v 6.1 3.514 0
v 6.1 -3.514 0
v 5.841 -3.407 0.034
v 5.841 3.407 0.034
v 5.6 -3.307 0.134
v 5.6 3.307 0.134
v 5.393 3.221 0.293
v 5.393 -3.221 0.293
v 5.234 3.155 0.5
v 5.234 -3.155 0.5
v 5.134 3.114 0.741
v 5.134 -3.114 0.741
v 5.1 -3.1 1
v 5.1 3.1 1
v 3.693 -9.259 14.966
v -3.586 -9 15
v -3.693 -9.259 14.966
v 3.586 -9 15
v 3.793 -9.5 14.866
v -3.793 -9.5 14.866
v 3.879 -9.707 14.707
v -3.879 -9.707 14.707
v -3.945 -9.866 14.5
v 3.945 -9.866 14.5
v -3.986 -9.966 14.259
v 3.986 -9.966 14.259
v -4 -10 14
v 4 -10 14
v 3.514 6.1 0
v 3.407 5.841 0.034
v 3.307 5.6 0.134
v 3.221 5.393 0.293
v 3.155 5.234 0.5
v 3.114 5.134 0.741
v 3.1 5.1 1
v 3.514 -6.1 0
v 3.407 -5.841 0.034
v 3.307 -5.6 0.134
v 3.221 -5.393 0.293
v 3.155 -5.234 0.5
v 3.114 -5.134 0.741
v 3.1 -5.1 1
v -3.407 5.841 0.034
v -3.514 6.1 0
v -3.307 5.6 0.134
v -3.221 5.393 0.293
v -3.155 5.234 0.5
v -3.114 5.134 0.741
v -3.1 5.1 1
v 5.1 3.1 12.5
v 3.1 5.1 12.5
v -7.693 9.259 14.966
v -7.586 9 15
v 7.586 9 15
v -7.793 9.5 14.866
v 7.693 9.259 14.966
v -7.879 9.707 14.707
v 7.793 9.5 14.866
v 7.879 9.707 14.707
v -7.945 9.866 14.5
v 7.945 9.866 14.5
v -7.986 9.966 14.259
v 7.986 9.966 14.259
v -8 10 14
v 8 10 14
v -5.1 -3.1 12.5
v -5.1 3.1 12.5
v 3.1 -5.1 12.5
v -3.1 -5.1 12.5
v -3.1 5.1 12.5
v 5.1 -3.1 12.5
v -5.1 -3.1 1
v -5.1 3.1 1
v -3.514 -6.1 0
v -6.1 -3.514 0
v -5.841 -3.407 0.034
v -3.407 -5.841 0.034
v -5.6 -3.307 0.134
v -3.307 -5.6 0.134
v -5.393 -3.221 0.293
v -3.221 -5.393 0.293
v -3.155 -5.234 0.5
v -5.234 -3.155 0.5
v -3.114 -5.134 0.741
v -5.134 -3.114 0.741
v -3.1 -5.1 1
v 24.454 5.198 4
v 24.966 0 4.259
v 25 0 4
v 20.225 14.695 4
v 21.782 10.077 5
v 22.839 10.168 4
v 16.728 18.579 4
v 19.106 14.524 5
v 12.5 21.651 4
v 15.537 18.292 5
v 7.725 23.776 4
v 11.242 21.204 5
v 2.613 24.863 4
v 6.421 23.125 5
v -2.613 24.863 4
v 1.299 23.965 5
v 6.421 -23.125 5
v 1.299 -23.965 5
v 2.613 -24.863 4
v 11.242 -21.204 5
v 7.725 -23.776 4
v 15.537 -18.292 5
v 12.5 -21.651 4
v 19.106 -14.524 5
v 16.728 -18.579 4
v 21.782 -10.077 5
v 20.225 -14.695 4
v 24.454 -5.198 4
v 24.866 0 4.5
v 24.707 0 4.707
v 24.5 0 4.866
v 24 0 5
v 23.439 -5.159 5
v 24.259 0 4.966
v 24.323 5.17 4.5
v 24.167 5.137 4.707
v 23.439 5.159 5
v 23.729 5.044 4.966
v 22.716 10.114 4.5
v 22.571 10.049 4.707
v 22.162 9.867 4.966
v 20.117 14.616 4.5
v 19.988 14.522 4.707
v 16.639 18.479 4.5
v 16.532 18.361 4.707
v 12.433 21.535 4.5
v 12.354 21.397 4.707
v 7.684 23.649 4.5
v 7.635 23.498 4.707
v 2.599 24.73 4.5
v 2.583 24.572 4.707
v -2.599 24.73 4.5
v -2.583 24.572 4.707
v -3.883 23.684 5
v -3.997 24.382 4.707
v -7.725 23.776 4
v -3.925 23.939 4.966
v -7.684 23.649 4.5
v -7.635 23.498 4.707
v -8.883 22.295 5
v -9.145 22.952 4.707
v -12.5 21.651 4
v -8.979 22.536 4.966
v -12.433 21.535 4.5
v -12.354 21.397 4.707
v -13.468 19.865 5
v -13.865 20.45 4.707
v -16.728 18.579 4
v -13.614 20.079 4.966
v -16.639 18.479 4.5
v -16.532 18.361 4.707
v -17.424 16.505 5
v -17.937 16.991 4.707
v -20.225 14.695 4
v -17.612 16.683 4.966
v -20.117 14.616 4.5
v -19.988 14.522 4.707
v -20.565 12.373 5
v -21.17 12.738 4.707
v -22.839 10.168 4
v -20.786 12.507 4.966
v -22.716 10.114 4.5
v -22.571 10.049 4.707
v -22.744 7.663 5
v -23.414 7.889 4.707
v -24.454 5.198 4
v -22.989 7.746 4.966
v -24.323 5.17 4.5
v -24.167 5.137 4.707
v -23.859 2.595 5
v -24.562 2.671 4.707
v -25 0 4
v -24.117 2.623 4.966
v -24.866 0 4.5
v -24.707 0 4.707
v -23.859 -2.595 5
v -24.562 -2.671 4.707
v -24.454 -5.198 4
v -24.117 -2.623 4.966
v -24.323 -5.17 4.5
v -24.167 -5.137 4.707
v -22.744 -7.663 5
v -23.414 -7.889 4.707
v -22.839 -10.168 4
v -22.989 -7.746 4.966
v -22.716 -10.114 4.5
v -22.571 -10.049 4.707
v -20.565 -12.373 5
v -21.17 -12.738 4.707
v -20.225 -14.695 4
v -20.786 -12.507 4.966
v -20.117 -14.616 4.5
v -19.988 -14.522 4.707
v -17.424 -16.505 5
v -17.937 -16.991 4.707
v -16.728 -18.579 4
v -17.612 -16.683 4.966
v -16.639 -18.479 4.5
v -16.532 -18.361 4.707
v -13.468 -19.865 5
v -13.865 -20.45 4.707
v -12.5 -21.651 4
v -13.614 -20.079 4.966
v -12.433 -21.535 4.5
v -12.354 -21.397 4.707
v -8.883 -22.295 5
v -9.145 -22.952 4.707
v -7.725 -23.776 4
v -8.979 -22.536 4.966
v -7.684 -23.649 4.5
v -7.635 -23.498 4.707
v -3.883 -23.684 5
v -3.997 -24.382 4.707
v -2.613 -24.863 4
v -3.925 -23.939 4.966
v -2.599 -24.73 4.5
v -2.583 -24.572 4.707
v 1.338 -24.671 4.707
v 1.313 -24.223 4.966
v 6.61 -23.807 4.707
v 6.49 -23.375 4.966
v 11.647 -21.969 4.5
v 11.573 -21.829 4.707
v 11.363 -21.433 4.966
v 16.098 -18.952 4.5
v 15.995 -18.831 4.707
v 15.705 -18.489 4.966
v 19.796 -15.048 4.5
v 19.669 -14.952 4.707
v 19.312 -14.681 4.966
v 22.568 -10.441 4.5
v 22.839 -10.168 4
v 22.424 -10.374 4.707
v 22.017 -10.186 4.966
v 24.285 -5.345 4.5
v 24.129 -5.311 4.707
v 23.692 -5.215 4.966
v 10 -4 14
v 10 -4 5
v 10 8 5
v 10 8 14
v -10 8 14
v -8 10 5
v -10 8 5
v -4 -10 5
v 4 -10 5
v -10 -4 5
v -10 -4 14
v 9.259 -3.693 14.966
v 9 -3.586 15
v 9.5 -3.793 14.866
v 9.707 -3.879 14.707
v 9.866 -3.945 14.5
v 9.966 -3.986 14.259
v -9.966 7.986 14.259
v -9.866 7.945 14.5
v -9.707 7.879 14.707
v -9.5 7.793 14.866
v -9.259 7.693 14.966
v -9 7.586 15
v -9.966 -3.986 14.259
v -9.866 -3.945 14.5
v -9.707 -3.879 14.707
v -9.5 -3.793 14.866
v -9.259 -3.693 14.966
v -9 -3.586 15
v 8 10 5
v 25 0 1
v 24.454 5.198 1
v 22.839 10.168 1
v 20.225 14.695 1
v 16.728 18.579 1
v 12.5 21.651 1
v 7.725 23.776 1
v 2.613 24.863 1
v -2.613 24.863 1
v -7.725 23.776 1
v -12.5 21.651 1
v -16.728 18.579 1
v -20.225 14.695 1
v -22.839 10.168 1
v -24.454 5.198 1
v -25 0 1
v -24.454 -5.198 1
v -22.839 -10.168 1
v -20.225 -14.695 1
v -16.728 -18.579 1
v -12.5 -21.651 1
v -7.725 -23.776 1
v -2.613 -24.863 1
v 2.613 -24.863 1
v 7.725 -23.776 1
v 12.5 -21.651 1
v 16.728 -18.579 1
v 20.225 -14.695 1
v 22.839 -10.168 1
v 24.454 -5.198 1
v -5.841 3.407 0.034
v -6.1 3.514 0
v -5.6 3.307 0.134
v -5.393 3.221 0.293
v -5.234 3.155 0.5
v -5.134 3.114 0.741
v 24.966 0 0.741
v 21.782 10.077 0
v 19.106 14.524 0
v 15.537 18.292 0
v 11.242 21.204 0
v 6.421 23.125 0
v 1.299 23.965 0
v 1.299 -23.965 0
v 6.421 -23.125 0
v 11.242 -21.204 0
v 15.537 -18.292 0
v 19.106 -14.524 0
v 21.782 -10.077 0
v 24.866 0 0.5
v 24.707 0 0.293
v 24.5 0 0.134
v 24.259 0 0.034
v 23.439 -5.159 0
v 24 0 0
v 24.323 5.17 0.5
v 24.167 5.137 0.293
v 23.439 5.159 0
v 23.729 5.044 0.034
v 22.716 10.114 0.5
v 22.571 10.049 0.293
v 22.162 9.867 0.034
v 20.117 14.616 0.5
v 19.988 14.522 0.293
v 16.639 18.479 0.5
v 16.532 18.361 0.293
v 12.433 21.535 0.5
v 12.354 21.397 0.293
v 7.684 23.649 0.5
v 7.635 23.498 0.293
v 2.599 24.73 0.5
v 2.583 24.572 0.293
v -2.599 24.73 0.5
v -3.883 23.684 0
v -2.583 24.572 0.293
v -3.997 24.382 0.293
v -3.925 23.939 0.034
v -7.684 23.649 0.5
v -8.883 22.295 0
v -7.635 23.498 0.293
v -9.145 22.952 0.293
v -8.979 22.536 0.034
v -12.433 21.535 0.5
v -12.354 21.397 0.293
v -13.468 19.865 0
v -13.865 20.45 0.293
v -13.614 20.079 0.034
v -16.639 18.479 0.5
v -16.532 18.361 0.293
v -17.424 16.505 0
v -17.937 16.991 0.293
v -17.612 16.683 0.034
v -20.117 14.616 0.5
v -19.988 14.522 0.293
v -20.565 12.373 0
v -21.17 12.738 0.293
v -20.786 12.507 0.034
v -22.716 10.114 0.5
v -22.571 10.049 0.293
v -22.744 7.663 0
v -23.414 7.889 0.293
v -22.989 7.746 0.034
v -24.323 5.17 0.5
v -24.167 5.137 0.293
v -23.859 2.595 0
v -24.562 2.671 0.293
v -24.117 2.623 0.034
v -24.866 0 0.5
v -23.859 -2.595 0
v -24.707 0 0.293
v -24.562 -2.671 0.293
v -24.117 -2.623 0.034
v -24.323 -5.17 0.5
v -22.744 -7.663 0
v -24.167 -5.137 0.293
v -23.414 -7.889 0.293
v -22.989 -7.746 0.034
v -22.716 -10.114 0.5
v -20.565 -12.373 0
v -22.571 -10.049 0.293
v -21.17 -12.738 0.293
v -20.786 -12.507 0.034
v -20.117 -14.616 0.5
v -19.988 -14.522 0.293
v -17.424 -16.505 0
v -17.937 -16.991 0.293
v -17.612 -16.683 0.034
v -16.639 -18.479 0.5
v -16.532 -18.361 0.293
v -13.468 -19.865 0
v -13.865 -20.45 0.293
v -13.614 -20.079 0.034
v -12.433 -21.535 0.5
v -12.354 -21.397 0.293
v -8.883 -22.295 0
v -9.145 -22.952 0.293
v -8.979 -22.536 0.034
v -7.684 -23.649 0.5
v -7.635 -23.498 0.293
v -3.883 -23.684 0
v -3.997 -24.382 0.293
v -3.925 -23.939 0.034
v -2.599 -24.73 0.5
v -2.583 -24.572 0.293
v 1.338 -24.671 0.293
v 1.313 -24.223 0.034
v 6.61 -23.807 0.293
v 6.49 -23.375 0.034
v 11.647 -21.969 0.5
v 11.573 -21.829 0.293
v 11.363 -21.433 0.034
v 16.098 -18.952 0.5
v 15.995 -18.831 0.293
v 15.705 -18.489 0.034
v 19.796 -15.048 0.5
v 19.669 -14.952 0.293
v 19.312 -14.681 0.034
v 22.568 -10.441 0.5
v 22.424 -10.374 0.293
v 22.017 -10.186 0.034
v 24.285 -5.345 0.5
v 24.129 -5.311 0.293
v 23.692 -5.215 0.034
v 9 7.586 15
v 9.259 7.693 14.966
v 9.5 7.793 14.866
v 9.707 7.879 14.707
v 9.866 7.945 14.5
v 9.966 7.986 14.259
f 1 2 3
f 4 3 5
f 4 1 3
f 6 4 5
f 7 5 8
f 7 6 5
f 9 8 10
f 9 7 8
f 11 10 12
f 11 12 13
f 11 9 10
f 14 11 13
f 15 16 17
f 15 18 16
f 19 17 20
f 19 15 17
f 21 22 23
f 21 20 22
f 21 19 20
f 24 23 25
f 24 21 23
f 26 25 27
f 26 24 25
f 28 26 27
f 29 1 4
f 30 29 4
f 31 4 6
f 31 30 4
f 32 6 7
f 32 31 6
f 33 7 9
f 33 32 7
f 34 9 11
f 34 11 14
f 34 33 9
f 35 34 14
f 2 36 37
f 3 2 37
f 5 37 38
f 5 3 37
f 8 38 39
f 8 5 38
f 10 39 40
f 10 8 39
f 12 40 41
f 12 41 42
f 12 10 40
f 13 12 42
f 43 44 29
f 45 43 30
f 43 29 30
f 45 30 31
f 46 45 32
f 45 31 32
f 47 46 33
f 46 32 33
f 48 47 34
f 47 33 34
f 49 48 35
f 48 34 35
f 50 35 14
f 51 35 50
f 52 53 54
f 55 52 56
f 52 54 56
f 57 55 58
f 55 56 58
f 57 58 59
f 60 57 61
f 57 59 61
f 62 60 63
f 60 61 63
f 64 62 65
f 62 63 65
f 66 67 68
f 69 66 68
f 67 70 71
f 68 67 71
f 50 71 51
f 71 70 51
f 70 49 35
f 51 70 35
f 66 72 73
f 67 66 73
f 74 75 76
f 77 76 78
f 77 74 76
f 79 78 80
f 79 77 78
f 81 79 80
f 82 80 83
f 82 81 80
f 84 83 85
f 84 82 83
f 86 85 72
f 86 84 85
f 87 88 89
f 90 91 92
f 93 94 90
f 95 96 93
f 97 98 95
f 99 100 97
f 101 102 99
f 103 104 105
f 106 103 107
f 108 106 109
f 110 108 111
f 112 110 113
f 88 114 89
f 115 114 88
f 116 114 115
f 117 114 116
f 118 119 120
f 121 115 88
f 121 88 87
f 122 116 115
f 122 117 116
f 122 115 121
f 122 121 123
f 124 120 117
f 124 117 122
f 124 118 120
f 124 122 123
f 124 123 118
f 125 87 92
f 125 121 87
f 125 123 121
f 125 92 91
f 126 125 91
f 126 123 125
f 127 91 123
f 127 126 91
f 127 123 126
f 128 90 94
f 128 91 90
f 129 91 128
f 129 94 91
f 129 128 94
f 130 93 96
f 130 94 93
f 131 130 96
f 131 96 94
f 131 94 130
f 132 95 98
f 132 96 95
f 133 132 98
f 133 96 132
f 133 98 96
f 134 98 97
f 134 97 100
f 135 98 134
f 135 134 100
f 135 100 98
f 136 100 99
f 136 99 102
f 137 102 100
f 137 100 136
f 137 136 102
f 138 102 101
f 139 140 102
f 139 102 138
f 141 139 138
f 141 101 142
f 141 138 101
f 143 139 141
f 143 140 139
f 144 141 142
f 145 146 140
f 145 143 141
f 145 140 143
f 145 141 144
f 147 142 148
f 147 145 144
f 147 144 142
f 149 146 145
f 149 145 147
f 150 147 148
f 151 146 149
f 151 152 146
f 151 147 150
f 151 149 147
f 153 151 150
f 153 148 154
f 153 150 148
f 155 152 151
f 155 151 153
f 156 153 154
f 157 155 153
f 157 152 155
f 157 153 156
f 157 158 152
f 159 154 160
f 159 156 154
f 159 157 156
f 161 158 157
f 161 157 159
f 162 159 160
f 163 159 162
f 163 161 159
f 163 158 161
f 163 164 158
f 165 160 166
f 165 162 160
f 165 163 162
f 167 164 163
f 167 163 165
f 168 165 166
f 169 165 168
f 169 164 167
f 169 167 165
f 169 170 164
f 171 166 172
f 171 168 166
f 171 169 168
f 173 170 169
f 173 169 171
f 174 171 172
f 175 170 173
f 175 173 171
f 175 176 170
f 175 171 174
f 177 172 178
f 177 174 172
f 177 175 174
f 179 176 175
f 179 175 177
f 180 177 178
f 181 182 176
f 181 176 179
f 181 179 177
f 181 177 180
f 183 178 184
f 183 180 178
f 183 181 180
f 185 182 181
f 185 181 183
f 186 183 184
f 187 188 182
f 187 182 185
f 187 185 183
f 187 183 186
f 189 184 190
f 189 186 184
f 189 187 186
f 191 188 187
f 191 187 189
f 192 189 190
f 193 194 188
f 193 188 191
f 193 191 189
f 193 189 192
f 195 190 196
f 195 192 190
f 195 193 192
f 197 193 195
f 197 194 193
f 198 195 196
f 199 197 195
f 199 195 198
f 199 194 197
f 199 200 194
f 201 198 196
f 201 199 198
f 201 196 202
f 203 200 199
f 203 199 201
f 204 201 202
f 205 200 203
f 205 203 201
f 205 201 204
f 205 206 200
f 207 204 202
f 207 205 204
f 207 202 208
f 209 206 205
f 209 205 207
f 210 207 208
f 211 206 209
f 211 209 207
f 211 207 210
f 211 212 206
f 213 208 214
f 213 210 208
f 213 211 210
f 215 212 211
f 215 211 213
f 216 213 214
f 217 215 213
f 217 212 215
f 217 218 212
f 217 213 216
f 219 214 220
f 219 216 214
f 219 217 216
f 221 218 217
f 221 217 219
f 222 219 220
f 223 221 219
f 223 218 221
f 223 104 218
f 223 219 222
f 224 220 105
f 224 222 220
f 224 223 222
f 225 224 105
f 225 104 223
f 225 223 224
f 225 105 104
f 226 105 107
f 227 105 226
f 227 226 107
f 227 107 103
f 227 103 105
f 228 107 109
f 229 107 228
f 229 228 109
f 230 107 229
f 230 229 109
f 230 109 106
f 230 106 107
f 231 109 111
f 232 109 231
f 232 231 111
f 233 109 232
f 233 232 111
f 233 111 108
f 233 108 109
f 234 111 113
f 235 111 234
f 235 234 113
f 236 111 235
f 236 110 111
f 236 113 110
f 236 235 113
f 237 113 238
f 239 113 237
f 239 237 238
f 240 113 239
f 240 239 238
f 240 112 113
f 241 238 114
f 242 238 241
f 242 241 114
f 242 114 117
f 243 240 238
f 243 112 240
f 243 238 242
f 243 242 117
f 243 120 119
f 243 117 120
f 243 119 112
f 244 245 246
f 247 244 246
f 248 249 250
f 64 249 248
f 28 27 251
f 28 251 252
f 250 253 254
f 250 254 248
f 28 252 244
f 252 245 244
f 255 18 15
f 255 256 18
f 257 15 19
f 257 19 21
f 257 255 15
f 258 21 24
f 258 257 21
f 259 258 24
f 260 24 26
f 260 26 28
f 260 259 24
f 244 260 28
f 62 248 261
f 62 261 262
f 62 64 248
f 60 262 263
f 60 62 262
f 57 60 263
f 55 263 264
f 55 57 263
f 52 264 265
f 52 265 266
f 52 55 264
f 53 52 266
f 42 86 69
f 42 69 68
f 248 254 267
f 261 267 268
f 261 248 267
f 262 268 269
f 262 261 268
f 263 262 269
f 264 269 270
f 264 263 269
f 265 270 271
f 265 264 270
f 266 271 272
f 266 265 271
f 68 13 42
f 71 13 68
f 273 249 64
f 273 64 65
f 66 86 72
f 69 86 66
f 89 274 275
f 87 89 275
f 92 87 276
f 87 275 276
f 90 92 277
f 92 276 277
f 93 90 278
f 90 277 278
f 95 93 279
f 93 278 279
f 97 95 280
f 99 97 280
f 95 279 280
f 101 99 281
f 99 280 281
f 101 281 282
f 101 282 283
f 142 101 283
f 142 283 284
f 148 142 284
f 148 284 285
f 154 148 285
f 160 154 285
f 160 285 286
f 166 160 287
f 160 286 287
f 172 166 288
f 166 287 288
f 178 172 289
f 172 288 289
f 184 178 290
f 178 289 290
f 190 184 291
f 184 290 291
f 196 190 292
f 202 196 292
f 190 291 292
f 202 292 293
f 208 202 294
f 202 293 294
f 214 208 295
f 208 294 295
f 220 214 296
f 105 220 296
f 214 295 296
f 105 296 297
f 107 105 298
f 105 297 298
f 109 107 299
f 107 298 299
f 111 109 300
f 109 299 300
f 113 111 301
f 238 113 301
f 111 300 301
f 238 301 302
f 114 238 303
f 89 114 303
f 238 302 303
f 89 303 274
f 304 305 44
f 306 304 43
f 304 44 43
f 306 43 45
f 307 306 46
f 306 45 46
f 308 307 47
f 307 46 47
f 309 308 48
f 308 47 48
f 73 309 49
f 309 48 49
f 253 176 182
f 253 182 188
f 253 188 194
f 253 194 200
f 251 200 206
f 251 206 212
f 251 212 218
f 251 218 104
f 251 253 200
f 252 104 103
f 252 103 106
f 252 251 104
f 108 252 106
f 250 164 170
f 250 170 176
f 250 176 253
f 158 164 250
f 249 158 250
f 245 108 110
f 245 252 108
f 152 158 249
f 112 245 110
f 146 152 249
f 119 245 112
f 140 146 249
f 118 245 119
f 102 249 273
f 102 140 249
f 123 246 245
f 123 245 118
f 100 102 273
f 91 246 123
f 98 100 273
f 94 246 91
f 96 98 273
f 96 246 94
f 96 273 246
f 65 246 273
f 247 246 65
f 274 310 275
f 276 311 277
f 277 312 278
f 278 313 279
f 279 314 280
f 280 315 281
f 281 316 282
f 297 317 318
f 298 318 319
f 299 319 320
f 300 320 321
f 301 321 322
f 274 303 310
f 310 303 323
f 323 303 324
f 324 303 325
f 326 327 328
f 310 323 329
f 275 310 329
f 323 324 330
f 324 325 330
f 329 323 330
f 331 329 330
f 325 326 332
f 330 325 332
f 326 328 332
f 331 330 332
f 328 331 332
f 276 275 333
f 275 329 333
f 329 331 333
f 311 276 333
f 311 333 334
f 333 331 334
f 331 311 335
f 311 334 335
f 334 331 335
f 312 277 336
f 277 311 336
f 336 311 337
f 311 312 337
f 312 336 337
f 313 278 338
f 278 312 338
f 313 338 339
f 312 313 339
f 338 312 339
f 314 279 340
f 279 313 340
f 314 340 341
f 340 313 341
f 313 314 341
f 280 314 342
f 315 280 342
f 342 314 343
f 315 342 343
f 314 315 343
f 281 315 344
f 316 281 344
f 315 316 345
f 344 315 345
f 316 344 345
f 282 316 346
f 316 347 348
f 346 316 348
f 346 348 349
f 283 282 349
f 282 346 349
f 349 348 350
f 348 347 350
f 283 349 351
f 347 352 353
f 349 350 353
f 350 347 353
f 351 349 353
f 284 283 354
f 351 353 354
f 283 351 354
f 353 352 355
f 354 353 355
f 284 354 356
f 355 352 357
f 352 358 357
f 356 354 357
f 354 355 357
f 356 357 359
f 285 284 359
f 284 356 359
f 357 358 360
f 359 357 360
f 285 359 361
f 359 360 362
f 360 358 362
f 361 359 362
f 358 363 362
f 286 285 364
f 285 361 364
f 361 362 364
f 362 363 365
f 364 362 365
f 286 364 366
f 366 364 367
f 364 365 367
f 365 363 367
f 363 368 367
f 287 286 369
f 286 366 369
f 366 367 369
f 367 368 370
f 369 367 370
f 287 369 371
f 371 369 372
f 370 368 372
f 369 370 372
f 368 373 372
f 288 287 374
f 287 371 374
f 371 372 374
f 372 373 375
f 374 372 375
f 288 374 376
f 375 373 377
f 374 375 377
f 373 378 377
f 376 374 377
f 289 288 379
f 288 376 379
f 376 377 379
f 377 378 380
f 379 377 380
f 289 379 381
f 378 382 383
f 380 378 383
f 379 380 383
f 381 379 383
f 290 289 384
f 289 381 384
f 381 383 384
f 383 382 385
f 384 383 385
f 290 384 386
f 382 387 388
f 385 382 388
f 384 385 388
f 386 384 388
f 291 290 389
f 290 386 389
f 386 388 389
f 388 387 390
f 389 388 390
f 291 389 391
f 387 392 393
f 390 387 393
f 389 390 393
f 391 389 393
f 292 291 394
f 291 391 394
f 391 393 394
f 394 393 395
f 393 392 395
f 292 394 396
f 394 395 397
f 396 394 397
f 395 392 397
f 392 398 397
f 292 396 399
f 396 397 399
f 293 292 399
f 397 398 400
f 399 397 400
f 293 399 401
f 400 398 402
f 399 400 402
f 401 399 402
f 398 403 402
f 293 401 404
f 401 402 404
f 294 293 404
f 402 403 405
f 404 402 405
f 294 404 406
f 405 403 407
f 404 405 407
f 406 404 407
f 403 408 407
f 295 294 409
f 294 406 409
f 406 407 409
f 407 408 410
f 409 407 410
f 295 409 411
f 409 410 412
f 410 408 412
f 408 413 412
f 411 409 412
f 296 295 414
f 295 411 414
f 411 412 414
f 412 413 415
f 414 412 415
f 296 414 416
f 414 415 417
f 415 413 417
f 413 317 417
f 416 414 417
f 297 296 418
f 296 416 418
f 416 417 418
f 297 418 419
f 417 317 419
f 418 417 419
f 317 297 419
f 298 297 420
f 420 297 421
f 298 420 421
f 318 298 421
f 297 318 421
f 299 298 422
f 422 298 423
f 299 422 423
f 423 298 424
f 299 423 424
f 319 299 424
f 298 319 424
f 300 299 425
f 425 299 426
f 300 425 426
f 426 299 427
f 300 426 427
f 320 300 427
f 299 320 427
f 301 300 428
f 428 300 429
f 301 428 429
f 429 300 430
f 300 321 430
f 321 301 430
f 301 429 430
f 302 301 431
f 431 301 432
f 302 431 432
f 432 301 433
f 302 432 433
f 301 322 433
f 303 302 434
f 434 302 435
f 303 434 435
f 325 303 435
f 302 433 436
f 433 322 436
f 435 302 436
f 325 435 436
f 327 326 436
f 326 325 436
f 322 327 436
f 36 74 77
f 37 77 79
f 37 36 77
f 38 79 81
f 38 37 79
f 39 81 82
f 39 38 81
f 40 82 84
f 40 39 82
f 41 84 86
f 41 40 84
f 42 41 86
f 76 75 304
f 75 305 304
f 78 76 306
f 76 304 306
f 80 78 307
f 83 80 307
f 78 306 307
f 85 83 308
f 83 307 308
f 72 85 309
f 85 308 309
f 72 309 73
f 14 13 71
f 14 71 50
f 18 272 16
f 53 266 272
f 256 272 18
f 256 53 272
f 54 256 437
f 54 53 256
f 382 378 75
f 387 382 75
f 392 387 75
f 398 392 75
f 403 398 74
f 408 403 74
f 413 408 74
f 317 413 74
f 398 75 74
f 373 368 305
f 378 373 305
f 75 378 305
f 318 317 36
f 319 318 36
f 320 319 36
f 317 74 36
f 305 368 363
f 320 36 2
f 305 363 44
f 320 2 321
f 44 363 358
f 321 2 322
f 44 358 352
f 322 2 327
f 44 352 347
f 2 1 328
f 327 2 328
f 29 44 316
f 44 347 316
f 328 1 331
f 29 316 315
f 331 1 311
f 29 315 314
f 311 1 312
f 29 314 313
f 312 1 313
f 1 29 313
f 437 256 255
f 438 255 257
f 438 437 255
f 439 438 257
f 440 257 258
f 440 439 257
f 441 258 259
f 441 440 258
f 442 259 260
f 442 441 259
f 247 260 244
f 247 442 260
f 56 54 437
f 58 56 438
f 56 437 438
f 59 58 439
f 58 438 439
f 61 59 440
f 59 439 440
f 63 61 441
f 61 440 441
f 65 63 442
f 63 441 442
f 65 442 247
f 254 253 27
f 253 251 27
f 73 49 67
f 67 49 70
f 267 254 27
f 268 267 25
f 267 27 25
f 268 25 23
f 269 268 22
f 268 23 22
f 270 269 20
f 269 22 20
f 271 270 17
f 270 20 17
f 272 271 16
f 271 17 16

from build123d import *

# Parameters (mm, degrees)
BOX001_W        = 10.2
BOX001_H        = 10.2
BOX001_DEPTH    = 12.5
CHAMFER002_SIZE = 2
BOX_W           = 20
BOX_H           = 20
BOX_DEPTH       = 10
CHAMFER_SIZE    = 6
CHAMFER001_SIZE = 2
FILLET001_R     = 1
CYLINDER_R      = 25
CYLINDER_DEPTH  = 5
FILLET_R        = 1
FILLET002_R     = 1


with BuildPart() as chamfered_hole:
    # Box001 → Box001 (new body)
    with BuildSketch(Plane(origin=(-5.1, -5.1, 0), x_dir=(1, 0, 0), z_dir=(0, 0, 1))):
        with Locations((5.1, 5.1)):
            Rectangle(BOX001_W, BOX001_H)
    extrude(amount=BOX001_DEPTH)

    # Chamfer002
    chamfer002_edges = [chamfered_hole.edges().sort_by_distance(p)[0] for p in [
        (-5.1, -5.1, 6.25),
        (-5.1, 5.1, 6.25),
        (5.1, -5.1, 6.25),
        (5.1, 5.1, 6.25),
    ]]
    chamfer(chamfer002_edges, length=CHAMFER002_SIZE)


with BuildPart() as fillet001:
    # Box → Box (new body)
    with BuildSketch(Plane(origin=(-10, -10, 5), x_dir=(1, 0, 0), z_dir=(0, 0, 1))):
        with Locations((10, 10)):
            Rectangle(BOX_W, BOX_H)
    extrude(amount=BOX_DEPTH)

    # Chamfer
    chamfer_edges = [fillet001.edges().sort_by_distance(p)[0] for p in [
        (-10, -10, 10),
        (10, -10, 10),
    ]]
    chamfer(chamfer_edges, length=CHAMFER_SIZE)

    # Chamfer001
    chamfer001_edges = [fillet001.edges().sort_by_distance(p)[0] for p in [
        (-10, 10, 10),
        (10, 10, 10),
    ]]
    chamfer(chamfer001_edges, length=CHAMFER001_SIZE)

    # Fillet001
    fillet001_edges = [fillet001.edges().sort_by_distance(p)[0] for p in [
        (-10, 2, 15),
        (-9, 9, 15),
        (-7, -7, 15),
        (0, 10, 15),
        (0, -10, 15),
        (9, 9, 15),
        (7, -7, 15),
        (10, 2, 15),
    ]]
    fillet(fillet001_edges, radius=FILLET001_R)


with BuildPart() as print2_side_with_support:
    # Cylinder → Cylinder (new body)
    with BuildSketch(Plane.XY):
        Circle(CYLINDER_R)
    extrude(amount=CYLINDER_DEPTH)

    # Fillet
    fillet_edges = [print2_side_with_support.edges().sort_by_distance(p)[0] for p in [
        (-25, 0, 5),
        (-25, 0, 0),
    ]]
    fillet(fillet_edges, radius=FILLET_R)

    # Fusion: union Fillet001
    add(fillet001.part)

    # Cut: cut Chamfered hole
    add(chamfered_hole.part, mode=Mode.SUBTRACT)

    # Fillet002
    fillet002_edges = [print2_side_with_support.edges().sort_by_distance(p)[0] for p in [
        (0, -5.1, 0),
        (4.1, -4.1, 0),
        (5.1, 0, 0),
        (4.1, 4.1, 0),
        (0, 5.1, 0),
        (-4.1, 4.1, 0),
        (-5.1, 0, 0),
        (-4.1, -4.1, 0),
    ]]
    fillet(fillet002_edges, radius=FILLET002_R)


solid = print2_side_with_support.part
